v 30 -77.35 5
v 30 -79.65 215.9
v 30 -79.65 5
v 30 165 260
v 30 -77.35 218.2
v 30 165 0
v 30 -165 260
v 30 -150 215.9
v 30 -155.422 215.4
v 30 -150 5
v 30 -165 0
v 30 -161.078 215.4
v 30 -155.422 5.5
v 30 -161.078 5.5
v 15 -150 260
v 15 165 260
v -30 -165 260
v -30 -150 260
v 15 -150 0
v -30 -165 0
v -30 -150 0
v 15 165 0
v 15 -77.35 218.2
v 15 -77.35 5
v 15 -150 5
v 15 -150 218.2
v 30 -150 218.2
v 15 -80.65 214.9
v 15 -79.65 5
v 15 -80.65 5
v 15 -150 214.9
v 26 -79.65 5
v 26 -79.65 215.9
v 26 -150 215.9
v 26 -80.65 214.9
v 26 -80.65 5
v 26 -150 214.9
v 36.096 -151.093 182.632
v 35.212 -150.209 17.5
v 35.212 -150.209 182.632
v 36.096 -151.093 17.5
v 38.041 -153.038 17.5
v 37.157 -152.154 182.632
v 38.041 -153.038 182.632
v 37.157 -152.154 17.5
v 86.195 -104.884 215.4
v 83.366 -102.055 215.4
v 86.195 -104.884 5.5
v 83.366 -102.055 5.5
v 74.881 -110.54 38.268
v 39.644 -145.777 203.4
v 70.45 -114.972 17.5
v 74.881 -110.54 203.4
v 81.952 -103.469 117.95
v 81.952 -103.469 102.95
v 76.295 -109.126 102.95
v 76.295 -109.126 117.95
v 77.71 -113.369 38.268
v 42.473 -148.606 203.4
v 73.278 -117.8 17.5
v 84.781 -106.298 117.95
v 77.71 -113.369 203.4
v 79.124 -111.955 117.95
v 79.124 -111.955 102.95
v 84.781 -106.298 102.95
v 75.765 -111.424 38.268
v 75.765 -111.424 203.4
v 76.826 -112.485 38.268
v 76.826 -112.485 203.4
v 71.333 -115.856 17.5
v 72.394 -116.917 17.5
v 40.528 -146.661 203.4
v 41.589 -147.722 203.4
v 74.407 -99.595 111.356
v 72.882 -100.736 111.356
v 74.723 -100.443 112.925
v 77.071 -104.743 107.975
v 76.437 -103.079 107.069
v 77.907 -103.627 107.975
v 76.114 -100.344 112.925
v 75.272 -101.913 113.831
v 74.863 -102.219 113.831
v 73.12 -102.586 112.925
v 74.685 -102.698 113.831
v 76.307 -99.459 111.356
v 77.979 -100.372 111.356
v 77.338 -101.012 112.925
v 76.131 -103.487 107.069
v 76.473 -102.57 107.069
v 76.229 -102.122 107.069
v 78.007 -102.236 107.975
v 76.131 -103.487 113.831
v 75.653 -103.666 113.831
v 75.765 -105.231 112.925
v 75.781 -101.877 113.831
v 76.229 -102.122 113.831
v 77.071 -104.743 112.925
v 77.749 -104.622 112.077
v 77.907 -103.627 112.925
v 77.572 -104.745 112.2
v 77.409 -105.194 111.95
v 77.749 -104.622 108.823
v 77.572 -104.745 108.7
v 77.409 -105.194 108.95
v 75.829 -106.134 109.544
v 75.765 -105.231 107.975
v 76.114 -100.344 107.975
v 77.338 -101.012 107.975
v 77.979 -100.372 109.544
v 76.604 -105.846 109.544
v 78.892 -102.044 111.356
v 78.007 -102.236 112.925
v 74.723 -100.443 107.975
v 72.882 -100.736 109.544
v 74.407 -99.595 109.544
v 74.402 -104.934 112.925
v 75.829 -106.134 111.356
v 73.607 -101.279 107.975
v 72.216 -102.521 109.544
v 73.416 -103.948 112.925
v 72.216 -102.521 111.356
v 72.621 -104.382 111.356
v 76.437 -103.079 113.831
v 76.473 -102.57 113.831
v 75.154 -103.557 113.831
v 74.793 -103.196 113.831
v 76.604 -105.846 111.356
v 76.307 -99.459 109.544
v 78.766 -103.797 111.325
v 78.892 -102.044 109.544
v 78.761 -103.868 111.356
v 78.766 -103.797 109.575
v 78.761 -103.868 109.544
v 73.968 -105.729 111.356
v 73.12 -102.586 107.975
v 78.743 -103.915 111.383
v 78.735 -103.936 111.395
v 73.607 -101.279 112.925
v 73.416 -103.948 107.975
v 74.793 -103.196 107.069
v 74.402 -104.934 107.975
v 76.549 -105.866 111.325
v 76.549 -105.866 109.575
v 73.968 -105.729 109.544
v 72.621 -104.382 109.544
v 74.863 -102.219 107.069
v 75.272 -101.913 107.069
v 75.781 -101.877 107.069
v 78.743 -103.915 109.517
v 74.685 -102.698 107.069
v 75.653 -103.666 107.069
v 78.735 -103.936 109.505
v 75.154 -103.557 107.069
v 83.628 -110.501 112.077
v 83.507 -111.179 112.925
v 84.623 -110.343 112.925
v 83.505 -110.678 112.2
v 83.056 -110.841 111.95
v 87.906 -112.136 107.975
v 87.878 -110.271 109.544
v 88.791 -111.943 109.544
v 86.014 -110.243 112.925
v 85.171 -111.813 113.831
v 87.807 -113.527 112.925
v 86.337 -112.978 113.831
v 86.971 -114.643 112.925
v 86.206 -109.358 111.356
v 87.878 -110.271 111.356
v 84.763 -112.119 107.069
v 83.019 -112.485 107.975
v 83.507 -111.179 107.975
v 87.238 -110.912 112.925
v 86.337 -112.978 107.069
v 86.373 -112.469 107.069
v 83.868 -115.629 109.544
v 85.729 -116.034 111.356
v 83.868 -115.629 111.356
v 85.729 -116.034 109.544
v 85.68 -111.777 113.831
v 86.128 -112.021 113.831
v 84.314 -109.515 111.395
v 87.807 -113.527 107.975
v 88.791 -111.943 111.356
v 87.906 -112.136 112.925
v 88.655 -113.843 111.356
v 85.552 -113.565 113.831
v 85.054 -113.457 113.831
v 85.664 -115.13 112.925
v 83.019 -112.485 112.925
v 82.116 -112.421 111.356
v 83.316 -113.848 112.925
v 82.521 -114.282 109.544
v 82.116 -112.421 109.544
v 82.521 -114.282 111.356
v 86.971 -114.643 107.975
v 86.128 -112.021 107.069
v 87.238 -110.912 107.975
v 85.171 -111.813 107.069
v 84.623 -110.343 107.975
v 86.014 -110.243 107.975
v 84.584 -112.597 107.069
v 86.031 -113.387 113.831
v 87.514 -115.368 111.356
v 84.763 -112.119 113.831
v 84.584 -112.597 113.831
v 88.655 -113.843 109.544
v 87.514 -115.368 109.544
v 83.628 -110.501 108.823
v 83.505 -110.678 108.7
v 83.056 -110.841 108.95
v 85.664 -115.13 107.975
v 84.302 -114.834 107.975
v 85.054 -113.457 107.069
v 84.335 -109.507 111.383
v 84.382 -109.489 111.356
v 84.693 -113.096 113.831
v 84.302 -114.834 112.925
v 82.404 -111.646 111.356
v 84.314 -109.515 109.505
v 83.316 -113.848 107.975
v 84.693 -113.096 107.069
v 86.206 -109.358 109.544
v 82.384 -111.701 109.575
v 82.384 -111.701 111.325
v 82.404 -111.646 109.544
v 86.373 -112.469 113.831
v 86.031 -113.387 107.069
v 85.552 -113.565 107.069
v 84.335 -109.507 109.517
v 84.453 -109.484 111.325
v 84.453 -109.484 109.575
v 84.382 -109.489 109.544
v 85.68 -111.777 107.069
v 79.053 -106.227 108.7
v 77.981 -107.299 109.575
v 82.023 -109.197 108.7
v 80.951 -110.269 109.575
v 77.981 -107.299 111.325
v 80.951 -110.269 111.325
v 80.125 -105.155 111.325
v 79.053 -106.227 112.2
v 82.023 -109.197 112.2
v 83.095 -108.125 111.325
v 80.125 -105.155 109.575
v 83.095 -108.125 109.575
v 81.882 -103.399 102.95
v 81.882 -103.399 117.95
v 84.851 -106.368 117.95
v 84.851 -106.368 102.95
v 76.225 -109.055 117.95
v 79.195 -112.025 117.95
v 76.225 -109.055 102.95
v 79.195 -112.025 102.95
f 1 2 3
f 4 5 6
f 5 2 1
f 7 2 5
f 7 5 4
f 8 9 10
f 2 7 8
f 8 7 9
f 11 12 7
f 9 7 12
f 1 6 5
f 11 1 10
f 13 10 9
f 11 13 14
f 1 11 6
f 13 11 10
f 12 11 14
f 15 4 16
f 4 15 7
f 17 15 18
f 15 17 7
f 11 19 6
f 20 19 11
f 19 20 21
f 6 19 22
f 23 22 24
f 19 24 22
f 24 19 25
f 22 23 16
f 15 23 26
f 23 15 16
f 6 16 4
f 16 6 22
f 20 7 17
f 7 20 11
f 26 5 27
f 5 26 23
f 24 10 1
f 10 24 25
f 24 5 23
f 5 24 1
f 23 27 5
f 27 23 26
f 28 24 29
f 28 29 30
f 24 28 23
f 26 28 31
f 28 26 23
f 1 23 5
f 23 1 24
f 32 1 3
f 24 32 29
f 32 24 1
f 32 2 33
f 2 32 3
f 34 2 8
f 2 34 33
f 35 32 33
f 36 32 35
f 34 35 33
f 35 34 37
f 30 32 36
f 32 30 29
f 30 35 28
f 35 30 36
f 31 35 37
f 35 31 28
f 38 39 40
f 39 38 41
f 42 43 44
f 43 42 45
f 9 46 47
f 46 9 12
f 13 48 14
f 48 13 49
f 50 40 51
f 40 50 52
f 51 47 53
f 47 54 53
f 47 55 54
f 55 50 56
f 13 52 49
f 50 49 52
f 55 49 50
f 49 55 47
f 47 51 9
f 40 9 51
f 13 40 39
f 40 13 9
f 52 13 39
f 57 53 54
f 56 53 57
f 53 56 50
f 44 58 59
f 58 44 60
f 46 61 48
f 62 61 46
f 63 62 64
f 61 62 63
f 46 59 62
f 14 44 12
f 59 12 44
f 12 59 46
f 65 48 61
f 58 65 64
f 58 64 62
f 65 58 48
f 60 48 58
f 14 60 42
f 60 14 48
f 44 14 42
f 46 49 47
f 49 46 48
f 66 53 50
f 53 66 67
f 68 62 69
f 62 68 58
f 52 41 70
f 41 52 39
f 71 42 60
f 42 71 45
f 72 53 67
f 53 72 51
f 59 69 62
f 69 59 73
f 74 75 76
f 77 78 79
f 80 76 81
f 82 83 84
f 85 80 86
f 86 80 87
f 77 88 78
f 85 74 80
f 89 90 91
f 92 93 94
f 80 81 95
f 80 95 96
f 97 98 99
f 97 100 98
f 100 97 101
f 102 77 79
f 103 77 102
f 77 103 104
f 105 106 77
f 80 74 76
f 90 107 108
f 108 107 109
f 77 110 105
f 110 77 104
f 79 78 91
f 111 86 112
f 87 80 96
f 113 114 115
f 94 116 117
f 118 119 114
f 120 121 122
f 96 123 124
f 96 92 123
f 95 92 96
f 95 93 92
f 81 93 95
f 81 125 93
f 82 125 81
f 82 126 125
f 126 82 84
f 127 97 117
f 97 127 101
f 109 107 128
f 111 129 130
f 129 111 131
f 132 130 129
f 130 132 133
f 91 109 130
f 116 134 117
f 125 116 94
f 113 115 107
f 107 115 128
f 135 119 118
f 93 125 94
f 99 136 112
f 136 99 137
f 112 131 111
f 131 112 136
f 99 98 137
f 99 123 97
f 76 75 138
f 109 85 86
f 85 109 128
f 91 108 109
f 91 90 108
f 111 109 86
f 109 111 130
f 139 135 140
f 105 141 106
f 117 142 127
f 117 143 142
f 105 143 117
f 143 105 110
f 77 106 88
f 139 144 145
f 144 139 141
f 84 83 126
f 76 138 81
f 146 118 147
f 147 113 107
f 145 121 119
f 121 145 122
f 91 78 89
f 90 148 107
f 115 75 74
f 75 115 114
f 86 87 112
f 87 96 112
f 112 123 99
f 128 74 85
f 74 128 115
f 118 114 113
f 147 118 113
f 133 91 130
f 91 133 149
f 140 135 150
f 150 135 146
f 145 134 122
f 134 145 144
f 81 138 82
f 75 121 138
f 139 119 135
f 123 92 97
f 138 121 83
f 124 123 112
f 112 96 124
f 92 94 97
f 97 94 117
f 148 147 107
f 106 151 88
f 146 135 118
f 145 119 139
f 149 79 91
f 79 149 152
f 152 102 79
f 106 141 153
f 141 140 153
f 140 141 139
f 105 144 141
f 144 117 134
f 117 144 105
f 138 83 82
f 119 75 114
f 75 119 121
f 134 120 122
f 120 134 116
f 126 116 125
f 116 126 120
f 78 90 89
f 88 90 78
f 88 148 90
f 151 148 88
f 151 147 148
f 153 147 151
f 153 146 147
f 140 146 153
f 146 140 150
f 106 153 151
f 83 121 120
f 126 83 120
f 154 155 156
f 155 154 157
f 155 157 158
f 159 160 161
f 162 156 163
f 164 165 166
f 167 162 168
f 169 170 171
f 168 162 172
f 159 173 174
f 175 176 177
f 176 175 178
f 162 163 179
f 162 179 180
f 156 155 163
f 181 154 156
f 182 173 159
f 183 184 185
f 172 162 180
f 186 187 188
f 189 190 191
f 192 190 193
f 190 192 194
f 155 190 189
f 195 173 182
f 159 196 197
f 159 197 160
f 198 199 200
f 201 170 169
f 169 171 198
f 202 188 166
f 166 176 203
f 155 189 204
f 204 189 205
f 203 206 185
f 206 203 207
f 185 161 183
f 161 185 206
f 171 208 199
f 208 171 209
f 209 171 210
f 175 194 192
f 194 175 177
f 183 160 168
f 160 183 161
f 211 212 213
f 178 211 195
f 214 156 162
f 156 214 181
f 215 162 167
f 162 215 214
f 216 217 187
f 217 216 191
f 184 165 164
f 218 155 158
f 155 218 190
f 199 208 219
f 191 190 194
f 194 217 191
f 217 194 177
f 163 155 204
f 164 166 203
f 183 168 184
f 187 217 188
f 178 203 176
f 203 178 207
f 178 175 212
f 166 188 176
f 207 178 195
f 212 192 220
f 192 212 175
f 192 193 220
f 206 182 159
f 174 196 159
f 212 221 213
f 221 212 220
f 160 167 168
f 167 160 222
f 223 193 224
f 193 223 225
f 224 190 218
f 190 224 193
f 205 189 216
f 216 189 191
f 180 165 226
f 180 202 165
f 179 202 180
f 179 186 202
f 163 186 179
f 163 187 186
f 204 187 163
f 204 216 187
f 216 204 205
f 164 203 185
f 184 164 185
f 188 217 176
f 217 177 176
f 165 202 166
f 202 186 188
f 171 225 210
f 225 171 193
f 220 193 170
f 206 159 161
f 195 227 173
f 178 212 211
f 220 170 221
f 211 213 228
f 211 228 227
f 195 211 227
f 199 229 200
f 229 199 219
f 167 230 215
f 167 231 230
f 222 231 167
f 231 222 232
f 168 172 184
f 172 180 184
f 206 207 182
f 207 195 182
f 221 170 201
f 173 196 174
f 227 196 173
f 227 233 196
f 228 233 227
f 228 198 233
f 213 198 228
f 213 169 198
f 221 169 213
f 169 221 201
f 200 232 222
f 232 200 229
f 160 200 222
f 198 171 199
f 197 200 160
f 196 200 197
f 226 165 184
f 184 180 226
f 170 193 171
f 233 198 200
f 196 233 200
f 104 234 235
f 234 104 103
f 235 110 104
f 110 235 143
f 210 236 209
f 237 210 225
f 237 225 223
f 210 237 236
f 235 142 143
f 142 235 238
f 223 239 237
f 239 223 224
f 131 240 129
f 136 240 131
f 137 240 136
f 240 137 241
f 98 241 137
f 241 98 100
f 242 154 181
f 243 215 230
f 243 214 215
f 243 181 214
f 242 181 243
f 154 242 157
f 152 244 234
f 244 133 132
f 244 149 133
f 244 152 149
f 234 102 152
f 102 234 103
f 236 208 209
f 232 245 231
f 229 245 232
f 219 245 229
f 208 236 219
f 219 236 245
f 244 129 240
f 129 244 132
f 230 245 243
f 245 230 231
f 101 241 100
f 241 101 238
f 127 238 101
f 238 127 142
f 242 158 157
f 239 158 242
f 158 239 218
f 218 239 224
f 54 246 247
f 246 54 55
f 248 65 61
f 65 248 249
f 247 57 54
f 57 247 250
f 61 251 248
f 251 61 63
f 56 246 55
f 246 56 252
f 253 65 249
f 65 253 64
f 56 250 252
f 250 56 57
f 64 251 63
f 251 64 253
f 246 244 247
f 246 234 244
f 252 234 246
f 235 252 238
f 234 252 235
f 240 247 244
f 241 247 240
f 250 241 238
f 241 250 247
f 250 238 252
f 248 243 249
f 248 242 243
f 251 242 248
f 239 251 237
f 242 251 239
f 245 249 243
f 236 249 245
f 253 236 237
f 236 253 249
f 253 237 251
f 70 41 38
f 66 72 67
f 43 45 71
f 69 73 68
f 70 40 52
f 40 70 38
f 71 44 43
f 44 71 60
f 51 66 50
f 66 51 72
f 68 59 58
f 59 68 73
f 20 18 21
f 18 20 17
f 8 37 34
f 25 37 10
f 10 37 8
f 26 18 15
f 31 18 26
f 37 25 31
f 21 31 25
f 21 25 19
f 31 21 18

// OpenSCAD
// file: ../doors/basicdoor.scad
module basicdoor(width=95.3, height=213.2, wall_thickness=15, right_handed = false, open_angle = 30) 
{
    profile_width = 12;
    door_thickness = 4.0;
    frame_profile_width = 2.3;
    frame_profile_depth = wall_thickness;
    seal_profile_width = 1.0;
    
    /* Outer frame fixed to convrete wall. */
    color([0.3,0.0,0.1])
    basicdoorframe(false, width, height, frame_profile_width, frame_profile_depth);

    color([0.4,0.2,0.2])
    translate([0, door_thickness/2,-frame_profile_width/2])
    basicdoorframe(false, width - 2 * frame_profile_width,
        height - frame_profile_width, 
        seal_profile_width, frame_profile_depth - door_thickness);
    
    /* Calculate door size. */
    open_w = width - 2 * frame_profile_width - 0.6;
    open_h = height - frame_profile_width - 1.0;

    ow = open_w/2 + 0.2;
    translate([right_handed?-ow:ow, 
        -(frame_profile_depth-door_thickness)/2, -frame_profile_width/2])
    rotate([0, 0, right_handed?-open_angle:open_angle])
    translate([right_handed?ow:-ow, 0, 0])
     union() {
        /* Playwood */
        color([0.4,0.0,0.1])
        cube([open_w, 1.5, open_h], center=true);
        
        /* Door strengtehing. */
        color([0.5,0.2,0.2])
        basicdoorframe(true, open_w, open_h, profile_width, door_thickness);
        
         /* Diagonal strengthening */
        dx = open_w - 2*profile_width;
        dy = open_h - 2*profile_width;
        l = sqrt(dx*dx+dy*dy);
        rotate([0,-atan2(dx,dy), 0])
        color([0.5,0.2,0.2])
        cube([profile_width, door_thickness, l], center=true);
         
         /* Door knob */
         translate([right_handed ? open_w/2 - 6.0 : -open_w/2 + 6.0, 0, 0])
         color([218/255,172/255,96/255])
         doorknob(door_thickness);
    }
}

module basicdoorframe(draw_bottom=true,width=70, height=110, profile_width = 5, door_thickness = 8) 
{
    translate([-(width - profile_width)/2, 0, 0]) 
    cube([profile_width,door_thickness, height], center=true);
    
    translate([(width - profile_width)/2, 0, 0]) 
    cube([profile_width,door_thickness, height], center=true);

    if (draw_bottom) {
        translate([0, 0, -(height - profile_width)/2]) 
        cube([width, door_thickness, profile_width], center=true);
    }
    
    translate([0, 0, (height - profile_width)/2]) 
    cube([width, door_thickness, profile_width], center=true);
}    

module doorknob(door_thickness = 8)
{
    doorknob_length = 7;
    doorknob_r = 3.5;
    
    translate([0, doorknob_length, 0]) 
    sphere(r=doorknob_r);
    translate([0, -doorknob_length, 0]) 
    sphere(r=doorknob_r);
 
    rotate([90, 90, 0])
    cylinder(h = doorknob_length*2, r = 0.5 * doorknob_r, center=true);
   
    cube([8, door_thickness+0.2, 15],center=true); 
}

// For testing
basicdoor();
// main file
use <../doors/basicdoor.scad>

module walkincloset(width=330, length=60, wall_thickness=15, wall_height=260,wall_color=[1,1,1],wall_alpha=1.0) 
{
    /* Door opening size. We need some extra space for the door frame. */
    door_width = 80+5.3;
    door_height = 210+3.2;
    
    /* Position the door so that bottom of opening is 5 cm above floor level */
    door_y_pos = (wall_height-door_height)/2 - 5;
    
    /* Position the doors horizontally off the center. */
    door_x_pos = 5;
    door2_x_pos = -120;

    difference() {
         /* Wall */
        translate([0, -width/2 
            + wall_thickness/2, 
            wall_height/2]) 
        color(wall_color, wall_alpha)
        cube([length, wall_thickness, wall_height],center=true);

     
    }
    
    difference() {
        /* Wall */
        translate([length/2-wall_thickness/2, 0, wall_height/2]) 
        color(wall_color, wall_alpha)
        cube([wall_thickness, width, wall_height],center=true);
    
       /* Door hole  */
        translate([length/2-wall_thickness/2, 
            door2_x_pos,
            wall_height/2 - door_y_pos]) 
        color(wall_color, wall_alpha)
        cube([wall_thickness+1, door_width, door_height], center=true);
    }
    
        /* Door 2 */
    translate([length/2-wall_thickness/2, 
            door2_x_pos,
            wall_height/2 - door_y_pos]) 
    rotate([0,0,90])
        basicdoor(door_width, door_height, wall_thickness, true, 45);
   
}

// For testing
walkincloset();
